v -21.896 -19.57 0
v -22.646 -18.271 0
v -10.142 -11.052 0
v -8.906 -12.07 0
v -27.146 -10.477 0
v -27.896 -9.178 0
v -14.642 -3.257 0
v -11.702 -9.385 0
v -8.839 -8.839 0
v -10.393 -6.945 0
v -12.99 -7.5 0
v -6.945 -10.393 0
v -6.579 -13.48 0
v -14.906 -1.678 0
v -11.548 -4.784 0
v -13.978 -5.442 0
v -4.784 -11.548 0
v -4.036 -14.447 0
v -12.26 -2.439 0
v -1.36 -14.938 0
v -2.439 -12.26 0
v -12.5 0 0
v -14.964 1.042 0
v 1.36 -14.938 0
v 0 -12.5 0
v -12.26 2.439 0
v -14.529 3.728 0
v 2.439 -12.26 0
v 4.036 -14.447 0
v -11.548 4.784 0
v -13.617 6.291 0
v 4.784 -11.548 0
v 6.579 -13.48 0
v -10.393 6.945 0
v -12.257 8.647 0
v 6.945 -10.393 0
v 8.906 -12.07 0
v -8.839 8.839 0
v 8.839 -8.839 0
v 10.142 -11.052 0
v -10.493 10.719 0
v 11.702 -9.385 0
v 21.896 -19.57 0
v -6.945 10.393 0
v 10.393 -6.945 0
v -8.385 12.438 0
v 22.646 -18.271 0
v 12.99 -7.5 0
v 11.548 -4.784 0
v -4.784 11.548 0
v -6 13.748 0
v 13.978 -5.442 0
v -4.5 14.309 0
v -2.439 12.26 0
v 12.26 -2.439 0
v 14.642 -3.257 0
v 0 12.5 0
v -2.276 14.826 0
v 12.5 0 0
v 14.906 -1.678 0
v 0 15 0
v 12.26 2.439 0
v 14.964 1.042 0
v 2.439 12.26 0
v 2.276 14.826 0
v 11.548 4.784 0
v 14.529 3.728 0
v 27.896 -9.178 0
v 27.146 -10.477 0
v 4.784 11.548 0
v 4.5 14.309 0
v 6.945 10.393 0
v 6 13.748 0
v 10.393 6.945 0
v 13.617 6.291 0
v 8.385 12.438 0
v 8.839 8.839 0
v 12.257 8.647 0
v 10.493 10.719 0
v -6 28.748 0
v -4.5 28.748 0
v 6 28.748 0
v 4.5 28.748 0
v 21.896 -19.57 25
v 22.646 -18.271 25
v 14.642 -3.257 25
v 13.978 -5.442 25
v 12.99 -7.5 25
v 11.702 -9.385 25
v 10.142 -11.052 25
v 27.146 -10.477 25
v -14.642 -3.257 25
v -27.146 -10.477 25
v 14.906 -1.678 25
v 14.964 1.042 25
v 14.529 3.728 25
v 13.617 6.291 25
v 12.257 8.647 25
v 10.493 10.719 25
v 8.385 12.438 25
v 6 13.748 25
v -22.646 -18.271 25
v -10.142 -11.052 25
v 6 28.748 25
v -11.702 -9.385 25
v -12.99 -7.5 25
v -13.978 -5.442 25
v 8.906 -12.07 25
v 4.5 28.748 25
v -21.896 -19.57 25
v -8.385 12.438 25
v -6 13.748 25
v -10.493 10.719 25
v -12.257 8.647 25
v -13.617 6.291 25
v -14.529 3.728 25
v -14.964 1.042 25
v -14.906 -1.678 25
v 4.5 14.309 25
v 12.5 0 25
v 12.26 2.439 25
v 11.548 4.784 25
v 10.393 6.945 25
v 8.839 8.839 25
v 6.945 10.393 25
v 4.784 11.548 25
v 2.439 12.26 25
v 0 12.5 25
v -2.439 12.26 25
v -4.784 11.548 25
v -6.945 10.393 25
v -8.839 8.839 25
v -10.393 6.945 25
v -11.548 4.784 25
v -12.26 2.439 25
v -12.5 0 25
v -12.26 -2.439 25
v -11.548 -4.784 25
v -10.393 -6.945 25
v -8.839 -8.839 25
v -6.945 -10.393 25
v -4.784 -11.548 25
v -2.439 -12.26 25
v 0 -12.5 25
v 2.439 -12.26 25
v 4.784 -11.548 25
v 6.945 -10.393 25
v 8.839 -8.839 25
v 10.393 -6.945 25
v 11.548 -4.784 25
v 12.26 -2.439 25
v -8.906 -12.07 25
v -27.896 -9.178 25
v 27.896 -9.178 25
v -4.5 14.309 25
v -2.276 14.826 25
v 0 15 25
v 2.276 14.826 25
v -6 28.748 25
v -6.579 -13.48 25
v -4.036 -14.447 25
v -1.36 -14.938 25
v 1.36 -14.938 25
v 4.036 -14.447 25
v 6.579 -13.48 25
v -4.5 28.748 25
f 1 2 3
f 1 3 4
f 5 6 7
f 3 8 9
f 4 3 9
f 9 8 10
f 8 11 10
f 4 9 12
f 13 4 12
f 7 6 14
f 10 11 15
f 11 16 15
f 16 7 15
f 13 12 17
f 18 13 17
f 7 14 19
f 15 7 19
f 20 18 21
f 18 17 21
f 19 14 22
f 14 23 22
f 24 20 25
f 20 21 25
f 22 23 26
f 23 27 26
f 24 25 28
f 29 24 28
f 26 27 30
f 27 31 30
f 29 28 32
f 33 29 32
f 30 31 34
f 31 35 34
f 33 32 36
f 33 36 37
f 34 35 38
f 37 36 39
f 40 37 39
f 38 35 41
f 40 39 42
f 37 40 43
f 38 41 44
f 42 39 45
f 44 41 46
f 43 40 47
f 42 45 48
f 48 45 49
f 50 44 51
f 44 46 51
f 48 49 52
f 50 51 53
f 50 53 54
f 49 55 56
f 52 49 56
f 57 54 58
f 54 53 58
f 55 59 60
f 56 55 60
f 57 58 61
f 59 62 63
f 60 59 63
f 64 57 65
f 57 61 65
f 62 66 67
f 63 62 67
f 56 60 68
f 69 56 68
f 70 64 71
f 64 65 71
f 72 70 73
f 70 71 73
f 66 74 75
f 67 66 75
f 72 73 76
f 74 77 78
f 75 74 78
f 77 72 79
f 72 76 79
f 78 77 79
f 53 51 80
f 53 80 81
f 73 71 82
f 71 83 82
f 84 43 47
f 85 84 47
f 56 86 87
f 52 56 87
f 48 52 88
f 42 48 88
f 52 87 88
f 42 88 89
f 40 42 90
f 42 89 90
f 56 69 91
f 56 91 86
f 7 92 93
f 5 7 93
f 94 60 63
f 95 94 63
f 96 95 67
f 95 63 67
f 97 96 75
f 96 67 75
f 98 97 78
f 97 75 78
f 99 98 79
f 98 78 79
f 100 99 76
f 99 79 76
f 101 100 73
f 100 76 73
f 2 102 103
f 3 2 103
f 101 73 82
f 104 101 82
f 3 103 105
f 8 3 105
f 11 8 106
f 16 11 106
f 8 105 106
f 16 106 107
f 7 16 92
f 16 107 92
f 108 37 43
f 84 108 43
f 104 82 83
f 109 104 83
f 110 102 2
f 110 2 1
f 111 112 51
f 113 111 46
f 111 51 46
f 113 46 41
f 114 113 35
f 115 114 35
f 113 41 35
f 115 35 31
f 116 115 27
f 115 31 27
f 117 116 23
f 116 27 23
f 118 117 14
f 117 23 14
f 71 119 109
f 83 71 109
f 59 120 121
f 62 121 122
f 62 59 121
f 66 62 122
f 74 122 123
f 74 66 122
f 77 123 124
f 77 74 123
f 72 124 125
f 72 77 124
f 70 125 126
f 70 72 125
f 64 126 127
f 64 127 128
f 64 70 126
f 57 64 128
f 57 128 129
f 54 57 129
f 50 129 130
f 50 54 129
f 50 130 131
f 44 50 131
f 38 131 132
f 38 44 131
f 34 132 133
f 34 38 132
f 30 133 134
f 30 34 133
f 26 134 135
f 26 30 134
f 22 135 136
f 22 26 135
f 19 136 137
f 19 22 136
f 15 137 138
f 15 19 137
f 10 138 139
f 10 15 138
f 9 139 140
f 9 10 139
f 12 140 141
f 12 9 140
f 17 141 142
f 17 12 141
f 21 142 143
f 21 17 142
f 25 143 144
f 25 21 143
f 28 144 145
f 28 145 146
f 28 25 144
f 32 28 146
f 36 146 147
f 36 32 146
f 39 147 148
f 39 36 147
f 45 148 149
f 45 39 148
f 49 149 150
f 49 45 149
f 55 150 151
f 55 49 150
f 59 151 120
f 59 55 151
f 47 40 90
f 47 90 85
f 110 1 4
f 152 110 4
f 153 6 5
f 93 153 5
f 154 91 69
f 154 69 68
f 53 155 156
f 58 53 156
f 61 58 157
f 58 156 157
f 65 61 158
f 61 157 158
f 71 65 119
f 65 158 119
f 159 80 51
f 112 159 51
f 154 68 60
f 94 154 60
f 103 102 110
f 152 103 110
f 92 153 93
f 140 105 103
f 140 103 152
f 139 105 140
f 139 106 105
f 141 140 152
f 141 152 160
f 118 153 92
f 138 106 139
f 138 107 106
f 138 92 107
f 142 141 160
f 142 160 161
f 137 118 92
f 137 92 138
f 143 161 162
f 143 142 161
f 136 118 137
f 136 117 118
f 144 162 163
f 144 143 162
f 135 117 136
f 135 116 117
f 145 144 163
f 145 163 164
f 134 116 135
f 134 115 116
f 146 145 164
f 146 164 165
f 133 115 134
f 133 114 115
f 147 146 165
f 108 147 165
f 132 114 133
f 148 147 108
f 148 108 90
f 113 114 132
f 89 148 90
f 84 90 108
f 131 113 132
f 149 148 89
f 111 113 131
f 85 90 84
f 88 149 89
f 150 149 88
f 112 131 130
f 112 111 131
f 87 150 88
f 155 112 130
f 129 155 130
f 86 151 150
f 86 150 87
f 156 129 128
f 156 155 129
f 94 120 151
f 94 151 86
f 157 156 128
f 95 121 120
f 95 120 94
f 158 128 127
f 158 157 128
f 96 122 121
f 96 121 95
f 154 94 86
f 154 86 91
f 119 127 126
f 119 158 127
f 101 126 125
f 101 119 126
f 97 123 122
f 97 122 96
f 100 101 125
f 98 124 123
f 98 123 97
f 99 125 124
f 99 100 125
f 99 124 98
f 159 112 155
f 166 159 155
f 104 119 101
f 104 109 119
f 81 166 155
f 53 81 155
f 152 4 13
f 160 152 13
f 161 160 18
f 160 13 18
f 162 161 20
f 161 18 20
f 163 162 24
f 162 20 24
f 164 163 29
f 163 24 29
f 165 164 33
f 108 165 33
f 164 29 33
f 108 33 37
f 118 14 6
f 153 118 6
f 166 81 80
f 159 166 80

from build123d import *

# Parameters (mm, degrees)
F0_R     = 12.5
F1_DEPTH = 25
F3_DEPTH = 25


with BuildPart() as f1:
    # F0 (on Top) → F1 (new body)
    with BuildSketch(Plane.XY):
        with BuildLine():
            Line((-6, 28.747727), (-6, 13.747727))
            ThreePointArc((-6, 13.747727), (-12.990381, 7.5), (-14.905881, -1.677711))
            Line((-14.905881, -1.677711), (-27.896262, -9.177711))
            Line((-27.896262, -9.177711), (-24.896262, -14.373864))
            Line((-24.896262, -14.373864), (-21.896262, -19.570016))
            Line((-21.896262, -19.570016), (-8.905881, -12.070016))
            ThreePointArc((-8.905881, -12.070016), (0, -15), (8.905881, -12.070016))
            Line((8.905881, -12.070016), (21.896262, -19.570016))
            Line((21.896262, -19.570016), (24.896262, -14.373864))
            Line((24.896262, -14.373864), (27.896262, -9.177711))
            Line((27.896262, -9.177711), (14.905881, -1.677711))
            ThreePointArc((14.905881, -1.677711), (12.990381, 7.5), (6, 13.747727))
            Line((6, 13.747727), (6, 28.747727))
            Line((6, 28.747727), (0, 28.747727))
            Line((0, 28.747727), (-6, 28.747727))
        make_face()
        Circle(F0_R, mode=Mode.SUBTRACT)
    extrude(amount=F1_DEPTH)

    # F2 (on face) → F3 (cut)
    with BuildSketch(Plane.XY.offset(25)):
        with BuildLine():
            Line((4.5, 28.747727), (-4.5, 28.747727))
            Line((-4.5, 28.747727), (-4.5, 14.309088))
            ThreePointArc((-4.5, 14.309088), (0, 15), (4.5, 14.309088))
            Line((4.5, 14.309088), (4.5, 28.747727))
        make_face()
        with BuildLine():
            Line((27.146262, -10.476749), (14.642034, -3.25743))
            ThreePointArc((14.642034, -3.25743), (12.990381, -7.5), (10.142034, -11.051658))
            Line((10.142034, -11.051658), (22.646262, -18.270978))
            Line((22.646262, -18.270978), (27.146262, -10.476749))
        make_face()
        with BuildLine():
            Line((-22.646262, -18.270978), (-10.142034, -11.051658))
            ThreePointArc((-10.142034, -11.051658), (-12.990381, -7.5), (-14.642034, -3.25743))
            Line((-14.642034, -3.25743), (-27.146262, -10.476749))
            Line((-27.146262, -10.476749), (-22.646262, -18.270978))
        make_face()
    extrude(amount=-F3_DEPTH, mode=Mode.SUBTRACT)


solid = f1.part
